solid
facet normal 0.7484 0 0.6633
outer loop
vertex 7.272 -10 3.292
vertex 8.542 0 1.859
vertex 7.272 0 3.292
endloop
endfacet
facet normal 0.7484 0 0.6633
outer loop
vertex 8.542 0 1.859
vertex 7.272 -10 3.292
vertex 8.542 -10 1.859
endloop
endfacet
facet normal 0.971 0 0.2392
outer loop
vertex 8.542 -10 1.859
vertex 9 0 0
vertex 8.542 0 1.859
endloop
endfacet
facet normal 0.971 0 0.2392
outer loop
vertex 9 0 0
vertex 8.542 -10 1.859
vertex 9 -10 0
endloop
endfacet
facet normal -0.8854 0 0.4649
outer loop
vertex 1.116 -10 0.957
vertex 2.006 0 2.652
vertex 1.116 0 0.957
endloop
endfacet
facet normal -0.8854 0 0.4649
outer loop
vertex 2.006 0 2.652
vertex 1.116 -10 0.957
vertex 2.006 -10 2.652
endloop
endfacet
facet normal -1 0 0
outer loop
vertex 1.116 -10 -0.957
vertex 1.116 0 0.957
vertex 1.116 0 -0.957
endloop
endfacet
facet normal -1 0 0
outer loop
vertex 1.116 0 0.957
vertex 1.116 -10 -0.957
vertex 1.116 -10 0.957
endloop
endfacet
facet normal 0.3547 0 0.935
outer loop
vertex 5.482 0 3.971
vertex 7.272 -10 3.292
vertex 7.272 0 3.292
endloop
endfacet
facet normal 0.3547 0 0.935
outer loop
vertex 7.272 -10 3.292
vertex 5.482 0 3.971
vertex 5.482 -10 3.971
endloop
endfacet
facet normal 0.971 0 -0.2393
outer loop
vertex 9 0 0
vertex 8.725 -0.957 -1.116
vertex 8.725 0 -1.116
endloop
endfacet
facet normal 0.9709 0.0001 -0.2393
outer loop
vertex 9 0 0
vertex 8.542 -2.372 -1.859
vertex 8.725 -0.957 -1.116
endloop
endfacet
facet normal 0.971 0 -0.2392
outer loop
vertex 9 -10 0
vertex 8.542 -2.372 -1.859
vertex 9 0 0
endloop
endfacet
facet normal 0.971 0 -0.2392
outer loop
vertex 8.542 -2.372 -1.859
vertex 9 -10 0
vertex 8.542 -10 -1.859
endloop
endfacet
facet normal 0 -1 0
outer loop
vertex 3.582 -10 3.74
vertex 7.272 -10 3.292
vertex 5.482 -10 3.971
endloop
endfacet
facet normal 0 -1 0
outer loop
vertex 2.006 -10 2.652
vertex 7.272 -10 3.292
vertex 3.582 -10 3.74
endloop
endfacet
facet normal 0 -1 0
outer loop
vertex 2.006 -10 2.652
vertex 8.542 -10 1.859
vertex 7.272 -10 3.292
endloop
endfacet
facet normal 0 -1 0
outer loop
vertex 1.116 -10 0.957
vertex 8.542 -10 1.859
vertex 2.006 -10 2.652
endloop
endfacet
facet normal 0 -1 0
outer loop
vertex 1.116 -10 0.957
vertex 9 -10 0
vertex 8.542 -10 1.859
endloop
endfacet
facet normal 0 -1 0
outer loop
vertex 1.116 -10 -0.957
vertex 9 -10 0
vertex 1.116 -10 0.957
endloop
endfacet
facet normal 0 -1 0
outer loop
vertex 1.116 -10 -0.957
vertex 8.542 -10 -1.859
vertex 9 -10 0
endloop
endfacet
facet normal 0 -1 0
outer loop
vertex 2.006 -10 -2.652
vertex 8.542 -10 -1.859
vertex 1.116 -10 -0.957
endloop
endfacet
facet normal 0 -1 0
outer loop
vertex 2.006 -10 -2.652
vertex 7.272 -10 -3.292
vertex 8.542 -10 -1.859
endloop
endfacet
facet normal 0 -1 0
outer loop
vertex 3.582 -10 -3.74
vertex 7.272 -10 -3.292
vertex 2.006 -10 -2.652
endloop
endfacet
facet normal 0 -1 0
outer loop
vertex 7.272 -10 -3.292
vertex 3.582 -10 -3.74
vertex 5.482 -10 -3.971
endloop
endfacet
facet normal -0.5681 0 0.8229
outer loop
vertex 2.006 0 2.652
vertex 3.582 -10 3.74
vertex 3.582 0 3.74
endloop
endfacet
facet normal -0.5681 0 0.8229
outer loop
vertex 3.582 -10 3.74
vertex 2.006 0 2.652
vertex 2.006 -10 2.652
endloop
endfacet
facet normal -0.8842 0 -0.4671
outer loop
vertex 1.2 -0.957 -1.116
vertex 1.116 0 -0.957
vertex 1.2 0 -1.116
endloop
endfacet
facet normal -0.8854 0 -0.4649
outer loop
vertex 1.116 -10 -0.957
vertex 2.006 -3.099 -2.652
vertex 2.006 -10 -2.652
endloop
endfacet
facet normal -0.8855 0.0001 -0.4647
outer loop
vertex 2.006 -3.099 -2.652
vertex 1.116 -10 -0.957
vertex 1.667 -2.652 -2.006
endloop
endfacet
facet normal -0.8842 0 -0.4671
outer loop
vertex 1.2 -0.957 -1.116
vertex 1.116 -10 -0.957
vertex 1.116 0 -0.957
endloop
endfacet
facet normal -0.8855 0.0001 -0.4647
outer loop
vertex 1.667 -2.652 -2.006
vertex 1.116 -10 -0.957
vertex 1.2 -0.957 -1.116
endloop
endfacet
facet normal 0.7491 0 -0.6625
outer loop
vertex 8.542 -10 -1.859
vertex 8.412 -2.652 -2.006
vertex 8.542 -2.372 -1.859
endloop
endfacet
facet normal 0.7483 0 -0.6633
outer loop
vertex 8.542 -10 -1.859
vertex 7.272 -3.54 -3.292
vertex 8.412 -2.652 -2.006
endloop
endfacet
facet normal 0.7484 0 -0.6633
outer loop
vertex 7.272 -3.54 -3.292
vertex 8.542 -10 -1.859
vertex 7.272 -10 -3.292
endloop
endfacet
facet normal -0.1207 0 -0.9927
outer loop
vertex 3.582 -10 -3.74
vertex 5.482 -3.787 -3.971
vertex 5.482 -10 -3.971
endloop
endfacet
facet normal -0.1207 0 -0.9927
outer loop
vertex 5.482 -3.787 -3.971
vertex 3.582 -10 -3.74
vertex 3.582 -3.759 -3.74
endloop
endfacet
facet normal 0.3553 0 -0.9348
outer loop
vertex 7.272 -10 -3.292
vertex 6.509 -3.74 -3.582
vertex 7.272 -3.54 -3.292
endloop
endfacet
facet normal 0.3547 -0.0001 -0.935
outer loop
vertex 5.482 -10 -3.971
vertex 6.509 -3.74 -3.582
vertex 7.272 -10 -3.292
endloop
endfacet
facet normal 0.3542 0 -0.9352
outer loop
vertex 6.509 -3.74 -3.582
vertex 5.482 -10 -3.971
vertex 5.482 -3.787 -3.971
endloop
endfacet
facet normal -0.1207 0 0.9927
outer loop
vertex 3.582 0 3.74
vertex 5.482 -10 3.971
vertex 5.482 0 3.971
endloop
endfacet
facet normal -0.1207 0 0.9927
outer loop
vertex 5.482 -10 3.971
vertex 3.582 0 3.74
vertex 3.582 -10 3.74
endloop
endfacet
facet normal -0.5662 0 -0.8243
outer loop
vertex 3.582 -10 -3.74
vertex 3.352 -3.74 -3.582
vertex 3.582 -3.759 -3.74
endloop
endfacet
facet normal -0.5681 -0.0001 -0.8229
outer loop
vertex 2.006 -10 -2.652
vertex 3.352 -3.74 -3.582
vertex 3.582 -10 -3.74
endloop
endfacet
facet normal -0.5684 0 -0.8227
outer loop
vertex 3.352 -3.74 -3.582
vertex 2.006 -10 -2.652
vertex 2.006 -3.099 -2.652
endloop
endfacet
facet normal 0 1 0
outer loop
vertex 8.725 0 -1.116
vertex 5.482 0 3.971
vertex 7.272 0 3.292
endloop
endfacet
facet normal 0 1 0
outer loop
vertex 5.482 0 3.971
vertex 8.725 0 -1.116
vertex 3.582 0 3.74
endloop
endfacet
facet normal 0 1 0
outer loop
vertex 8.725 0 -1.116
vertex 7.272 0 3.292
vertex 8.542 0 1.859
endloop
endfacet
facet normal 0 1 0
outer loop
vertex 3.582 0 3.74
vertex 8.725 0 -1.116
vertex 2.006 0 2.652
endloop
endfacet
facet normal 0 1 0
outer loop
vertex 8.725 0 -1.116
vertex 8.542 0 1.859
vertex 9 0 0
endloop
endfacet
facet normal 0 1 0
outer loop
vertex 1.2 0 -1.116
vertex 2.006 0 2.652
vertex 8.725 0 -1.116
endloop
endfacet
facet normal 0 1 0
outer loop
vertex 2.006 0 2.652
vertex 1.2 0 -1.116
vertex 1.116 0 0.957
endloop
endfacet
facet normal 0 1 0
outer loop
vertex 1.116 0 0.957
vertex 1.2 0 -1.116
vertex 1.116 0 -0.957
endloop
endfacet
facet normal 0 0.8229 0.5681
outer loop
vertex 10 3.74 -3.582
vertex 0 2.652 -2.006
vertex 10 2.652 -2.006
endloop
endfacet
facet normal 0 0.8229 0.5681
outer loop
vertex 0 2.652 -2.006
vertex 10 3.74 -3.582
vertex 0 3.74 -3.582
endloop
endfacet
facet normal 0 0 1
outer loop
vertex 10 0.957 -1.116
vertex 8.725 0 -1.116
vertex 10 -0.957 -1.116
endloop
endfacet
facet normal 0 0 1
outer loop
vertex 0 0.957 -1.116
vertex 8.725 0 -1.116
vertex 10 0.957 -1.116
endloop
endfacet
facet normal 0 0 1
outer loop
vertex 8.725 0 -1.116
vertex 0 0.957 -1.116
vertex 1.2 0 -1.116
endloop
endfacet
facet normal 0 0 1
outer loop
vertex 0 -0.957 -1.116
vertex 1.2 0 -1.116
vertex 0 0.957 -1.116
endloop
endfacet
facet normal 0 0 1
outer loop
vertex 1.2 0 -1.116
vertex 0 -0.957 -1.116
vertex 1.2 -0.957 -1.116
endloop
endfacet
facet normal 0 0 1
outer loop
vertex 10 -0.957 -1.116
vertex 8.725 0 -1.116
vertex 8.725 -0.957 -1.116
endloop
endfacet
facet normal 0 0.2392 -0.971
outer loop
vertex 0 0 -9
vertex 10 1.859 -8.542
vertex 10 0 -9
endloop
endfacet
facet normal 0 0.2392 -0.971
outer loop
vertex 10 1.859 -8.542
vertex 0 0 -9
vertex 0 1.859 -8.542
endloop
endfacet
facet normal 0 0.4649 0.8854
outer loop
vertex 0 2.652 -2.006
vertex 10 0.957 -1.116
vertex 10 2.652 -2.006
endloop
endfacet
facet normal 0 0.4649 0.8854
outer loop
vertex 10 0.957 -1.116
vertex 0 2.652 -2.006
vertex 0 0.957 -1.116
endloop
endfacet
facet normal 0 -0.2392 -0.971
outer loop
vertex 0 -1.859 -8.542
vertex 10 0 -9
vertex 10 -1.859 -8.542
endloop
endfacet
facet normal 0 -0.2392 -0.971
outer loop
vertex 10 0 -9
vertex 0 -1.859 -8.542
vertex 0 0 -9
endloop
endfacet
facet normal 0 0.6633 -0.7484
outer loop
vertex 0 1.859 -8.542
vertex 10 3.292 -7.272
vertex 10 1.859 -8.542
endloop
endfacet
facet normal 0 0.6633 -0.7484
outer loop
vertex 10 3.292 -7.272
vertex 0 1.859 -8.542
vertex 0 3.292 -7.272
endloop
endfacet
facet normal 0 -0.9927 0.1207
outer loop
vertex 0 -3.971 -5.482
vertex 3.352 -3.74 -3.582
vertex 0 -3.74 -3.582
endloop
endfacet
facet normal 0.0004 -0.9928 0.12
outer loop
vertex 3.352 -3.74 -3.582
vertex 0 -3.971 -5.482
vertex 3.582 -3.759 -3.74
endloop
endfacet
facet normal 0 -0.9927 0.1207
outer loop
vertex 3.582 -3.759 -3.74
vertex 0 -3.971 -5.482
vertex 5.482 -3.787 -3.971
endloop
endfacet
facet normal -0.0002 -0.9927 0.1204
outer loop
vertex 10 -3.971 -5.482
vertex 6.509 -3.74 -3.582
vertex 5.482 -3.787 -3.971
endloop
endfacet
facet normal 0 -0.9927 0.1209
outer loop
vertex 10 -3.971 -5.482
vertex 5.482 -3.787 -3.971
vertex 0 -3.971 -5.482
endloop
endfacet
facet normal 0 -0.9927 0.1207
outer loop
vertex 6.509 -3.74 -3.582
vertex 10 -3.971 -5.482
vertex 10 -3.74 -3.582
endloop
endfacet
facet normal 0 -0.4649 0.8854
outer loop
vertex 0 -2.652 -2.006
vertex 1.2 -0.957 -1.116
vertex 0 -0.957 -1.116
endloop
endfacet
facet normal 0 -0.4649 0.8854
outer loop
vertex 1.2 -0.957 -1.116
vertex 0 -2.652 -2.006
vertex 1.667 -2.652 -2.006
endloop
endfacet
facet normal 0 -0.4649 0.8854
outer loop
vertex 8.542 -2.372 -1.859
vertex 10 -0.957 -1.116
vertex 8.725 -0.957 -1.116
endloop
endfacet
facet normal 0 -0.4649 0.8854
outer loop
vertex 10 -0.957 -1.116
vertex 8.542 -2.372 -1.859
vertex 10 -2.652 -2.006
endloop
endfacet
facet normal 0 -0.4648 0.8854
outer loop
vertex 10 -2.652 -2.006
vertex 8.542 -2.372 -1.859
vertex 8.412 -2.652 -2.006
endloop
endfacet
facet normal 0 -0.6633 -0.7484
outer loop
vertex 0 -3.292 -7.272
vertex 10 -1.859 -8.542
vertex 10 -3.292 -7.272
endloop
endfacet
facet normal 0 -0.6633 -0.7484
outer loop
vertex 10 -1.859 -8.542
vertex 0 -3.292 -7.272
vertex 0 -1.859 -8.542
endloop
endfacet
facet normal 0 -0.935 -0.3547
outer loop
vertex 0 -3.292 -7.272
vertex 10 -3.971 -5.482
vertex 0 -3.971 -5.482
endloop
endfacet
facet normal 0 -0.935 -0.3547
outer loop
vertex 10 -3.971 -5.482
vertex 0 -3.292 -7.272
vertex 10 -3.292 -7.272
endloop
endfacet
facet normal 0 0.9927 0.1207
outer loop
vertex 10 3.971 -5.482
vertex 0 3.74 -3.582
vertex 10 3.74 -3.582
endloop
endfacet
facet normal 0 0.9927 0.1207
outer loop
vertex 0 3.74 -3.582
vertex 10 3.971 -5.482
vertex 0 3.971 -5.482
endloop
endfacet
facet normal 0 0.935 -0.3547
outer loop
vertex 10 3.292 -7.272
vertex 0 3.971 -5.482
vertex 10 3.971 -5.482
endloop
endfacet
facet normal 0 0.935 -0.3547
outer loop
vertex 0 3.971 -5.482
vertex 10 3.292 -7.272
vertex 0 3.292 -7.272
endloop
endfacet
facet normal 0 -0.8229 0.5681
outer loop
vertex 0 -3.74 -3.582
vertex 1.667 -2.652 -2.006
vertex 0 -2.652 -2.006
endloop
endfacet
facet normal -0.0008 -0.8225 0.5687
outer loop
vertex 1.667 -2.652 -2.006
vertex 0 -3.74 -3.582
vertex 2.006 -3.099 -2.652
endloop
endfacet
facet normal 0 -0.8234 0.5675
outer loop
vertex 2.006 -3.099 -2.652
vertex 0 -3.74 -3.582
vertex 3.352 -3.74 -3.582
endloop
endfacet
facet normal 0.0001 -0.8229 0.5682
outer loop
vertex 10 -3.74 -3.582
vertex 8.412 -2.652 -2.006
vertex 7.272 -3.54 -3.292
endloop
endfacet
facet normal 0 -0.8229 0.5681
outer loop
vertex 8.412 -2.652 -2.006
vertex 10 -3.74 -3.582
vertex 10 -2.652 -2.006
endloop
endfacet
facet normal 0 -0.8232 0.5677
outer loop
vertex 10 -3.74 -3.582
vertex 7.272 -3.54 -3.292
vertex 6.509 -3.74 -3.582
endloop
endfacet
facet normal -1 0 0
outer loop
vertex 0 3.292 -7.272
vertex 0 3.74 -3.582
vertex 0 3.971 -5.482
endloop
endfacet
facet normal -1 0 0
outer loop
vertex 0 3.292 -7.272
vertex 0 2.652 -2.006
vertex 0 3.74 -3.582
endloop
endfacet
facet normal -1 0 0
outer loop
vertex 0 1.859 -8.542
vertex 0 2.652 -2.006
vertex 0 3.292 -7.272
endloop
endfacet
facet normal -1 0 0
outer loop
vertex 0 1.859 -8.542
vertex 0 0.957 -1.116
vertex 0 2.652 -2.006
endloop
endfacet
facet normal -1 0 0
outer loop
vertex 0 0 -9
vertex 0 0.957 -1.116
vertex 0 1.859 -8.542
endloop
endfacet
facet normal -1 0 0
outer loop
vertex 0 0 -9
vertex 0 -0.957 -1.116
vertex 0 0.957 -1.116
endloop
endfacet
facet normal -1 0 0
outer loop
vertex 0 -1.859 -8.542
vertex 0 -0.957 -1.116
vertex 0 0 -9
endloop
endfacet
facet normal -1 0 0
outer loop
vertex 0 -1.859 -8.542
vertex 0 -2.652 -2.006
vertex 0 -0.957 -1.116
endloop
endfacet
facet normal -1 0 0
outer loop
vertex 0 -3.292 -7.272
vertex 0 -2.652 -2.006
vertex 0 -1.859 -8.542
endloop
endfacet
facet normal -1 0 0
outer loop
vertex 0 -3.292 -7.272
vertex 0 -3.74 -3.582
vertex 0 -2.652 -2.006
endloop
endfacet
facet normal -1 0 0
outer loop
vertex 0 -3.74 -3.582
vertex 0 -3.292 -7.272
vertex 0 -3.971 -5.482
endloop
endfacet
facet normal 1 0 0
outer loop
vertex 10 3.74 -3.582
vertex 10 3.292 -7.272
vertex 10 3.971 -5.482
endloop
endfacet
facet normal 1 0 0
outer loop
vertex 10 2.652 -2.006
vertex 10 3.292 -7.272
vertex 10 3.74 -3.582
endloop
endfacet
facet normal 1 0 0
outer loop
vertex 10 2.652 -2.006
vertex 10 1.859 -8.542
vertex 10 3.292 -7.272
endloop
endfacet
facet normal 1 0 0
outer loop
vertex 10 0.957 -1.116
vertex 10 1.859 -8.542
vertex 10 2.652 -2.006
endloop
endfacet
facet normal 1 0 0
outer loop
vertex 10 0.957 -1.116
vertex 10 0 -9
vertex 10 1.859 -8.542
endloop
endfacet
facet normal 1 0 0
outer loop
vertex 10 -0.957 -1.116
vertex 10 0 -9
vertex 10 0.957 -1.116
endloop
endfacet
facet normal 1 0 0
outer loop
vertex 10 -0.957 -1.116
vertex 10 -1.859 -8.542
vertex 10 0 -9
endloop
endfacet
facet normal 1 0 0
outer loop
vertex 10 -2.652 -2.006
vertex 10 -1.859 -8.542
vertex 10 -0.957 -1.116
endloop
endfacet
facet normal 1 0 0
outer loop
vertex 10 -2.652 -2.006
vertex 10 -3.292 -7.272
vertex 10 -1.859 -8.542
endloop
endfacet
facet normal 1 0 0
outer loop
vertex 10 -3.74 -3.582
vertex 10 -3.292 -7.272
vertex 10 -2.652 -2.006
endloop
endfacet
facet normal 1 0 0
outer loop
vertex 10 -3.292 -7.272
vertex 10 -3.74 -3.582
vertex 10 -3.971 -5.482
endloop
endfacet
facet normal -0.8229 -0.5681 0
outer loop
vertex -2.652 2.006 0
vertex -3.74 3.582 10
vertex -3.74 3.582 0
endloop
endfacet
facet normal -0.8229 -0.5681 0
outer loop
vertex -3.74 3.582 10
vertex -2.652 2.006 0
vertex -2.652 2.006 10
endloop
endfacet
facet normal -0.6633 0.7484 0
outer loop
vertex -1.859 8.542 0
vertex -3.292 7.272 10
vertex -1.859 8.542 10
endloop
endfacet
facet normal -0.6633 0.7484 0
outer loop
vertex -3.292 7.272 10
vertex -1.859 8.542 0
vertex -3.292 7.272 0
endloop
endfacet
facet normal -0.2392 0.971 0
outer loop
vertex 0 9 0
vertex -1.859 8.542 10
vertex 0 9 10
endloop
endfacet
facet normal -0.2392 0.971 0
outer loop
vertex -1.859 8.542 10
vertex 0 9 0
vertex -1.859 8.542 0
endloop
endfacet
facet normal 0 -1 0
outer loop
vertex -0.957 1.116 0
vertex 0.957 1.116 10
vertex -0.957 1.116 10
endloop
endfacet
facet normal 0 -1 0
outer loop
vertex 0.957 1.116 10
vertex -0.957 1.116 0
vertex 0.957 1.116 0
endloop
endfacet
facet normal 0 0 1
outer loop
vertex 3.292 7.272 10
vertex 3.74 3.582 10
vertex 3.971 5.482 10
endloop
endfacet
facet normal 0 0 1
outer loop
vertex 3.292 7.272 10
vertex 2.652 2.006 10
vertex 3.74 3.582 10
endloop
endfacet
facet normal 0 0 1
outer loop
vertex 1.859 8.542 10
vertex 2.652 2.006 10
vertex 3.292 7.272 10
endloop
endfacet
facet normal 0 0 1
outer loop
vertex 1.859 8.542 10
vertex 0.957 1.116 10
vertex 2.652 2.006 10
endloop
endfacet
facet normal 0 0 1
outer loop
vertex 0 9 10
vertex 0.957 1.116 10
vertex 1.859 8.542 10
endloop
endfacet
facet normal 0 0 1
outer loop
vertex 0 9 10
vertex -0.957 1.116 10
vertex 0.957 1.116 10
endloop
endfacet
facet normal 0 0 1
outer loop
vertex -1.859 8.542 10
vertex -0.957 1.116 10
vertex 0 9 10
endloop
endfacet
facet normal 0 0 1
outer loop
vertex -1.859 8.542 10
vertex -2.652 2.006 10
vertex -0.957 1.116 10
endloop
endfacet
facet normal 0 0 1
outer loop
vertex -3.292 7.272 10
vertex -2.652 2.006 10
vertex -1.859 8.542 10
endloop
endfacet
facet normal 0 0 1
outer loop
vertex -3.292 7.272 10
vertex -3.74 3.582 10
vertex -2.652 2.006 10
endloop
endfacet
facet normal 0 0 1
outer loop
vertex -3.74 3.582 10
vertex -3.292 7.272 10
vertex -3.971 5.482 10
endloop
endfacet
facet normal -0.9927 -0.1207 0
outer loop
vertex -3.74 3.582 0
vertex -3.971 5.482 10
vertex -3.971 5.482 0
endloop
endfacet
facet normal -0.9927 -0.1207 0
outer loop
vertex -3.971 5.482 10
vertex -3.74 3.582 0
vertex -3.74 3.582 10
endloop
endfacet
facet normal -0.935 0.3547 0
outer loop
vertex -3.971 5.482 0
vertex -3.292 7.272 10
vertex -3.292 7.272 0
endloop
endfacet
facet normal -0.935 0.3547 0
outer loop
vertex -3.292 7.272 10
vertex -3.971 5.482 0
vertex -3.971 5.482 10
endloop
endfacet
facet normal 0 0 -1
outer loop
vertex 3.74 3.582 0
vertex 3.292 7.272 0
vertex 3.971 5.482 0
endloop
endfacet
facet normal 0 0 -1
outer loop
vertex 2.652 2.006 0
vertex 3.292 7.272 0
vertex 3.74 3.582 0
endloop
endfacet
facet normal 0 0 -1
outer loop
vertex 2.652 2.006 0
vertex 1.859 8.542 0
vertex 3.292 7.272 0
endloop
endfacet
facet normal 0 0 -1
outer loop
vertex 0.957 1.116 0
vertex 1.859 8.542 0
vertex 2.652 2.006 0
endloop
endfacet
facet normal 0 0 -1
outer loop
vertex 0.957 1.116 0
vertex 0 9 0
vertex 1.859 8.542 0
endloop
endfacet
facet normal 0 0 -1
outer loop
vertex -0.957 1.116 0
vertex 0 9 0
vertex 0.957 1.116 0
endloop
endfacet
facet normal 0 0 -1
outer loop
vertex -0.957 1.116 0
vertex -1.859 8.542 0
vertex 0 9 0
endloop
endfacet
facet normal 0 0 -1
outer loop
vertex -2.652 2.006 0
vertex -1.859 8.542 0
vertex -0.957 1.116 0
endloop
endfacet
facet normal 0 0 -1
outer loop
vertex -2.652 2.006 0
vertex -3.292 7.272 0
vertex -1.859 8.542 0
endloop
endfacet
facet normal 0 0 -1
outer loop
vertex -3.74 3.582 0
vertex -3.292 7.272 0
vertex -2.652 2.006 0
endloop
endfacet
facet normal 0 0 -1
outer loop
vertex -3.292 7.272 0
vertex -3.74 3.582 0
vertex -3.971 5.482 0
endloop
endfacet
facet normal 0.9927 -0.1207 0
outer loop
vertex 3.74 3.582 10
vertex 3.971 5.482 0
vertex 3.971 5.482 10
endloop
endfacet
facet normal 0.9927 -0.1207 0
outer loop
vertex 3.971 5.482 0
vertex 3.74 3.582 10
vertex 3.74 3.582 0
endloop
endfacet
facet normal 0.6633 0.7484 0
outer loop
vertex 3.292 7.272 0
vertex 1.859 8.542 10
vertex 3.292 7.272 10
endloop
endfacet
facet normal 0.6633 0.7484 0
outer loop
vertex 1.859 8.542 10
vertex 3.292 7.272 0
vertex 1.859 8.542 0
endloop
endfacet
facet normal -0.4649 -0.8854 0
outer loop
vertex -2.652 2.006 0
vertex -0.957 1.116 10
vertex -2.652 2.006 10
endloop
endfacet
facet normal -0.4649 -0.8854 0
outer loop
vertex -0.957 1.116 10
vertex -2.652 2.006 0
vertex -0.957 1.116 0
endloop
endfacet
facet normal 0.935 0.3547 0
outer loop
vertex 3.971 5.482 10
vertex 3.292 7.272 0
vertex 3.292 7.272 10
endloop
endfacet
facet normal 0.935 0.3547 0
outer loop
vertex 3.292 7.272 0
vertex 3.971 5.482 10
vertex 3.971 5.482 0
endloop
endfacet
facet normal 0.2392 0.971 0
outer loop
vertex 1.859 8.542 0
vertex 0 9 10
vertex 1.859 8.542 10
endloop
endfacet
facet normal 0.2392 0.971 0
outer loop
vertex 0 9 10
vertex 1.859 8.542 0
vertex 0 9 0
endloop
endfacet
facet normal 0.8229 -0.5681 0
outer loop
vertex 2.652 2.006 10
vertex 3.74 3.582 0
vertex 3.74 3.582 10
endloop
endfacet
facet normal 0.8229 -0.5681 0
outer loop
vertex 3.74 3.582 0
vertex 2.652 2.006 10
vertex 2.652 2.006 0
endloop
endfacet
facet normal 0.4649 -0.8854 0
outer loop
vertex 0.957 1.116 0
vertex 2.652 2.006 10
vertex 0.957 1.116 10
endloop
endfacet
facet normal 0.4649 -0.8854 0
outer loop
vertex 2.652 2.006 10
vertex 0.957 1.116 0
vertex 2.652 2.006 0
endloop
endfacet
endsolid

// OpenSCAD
rotate([90, 0, 0]) translate([5, 0, 0]) cylinder(h=10, r1=4, r2=4);
rotate([0, 90, 0]) translate([5, 0, 0]) cylinder(h=10, r1=4, r2=4);
rotate([0, 0, 90]) translate([5, 0, 0]) cylinder(h=10, r1=4, r2=4);
